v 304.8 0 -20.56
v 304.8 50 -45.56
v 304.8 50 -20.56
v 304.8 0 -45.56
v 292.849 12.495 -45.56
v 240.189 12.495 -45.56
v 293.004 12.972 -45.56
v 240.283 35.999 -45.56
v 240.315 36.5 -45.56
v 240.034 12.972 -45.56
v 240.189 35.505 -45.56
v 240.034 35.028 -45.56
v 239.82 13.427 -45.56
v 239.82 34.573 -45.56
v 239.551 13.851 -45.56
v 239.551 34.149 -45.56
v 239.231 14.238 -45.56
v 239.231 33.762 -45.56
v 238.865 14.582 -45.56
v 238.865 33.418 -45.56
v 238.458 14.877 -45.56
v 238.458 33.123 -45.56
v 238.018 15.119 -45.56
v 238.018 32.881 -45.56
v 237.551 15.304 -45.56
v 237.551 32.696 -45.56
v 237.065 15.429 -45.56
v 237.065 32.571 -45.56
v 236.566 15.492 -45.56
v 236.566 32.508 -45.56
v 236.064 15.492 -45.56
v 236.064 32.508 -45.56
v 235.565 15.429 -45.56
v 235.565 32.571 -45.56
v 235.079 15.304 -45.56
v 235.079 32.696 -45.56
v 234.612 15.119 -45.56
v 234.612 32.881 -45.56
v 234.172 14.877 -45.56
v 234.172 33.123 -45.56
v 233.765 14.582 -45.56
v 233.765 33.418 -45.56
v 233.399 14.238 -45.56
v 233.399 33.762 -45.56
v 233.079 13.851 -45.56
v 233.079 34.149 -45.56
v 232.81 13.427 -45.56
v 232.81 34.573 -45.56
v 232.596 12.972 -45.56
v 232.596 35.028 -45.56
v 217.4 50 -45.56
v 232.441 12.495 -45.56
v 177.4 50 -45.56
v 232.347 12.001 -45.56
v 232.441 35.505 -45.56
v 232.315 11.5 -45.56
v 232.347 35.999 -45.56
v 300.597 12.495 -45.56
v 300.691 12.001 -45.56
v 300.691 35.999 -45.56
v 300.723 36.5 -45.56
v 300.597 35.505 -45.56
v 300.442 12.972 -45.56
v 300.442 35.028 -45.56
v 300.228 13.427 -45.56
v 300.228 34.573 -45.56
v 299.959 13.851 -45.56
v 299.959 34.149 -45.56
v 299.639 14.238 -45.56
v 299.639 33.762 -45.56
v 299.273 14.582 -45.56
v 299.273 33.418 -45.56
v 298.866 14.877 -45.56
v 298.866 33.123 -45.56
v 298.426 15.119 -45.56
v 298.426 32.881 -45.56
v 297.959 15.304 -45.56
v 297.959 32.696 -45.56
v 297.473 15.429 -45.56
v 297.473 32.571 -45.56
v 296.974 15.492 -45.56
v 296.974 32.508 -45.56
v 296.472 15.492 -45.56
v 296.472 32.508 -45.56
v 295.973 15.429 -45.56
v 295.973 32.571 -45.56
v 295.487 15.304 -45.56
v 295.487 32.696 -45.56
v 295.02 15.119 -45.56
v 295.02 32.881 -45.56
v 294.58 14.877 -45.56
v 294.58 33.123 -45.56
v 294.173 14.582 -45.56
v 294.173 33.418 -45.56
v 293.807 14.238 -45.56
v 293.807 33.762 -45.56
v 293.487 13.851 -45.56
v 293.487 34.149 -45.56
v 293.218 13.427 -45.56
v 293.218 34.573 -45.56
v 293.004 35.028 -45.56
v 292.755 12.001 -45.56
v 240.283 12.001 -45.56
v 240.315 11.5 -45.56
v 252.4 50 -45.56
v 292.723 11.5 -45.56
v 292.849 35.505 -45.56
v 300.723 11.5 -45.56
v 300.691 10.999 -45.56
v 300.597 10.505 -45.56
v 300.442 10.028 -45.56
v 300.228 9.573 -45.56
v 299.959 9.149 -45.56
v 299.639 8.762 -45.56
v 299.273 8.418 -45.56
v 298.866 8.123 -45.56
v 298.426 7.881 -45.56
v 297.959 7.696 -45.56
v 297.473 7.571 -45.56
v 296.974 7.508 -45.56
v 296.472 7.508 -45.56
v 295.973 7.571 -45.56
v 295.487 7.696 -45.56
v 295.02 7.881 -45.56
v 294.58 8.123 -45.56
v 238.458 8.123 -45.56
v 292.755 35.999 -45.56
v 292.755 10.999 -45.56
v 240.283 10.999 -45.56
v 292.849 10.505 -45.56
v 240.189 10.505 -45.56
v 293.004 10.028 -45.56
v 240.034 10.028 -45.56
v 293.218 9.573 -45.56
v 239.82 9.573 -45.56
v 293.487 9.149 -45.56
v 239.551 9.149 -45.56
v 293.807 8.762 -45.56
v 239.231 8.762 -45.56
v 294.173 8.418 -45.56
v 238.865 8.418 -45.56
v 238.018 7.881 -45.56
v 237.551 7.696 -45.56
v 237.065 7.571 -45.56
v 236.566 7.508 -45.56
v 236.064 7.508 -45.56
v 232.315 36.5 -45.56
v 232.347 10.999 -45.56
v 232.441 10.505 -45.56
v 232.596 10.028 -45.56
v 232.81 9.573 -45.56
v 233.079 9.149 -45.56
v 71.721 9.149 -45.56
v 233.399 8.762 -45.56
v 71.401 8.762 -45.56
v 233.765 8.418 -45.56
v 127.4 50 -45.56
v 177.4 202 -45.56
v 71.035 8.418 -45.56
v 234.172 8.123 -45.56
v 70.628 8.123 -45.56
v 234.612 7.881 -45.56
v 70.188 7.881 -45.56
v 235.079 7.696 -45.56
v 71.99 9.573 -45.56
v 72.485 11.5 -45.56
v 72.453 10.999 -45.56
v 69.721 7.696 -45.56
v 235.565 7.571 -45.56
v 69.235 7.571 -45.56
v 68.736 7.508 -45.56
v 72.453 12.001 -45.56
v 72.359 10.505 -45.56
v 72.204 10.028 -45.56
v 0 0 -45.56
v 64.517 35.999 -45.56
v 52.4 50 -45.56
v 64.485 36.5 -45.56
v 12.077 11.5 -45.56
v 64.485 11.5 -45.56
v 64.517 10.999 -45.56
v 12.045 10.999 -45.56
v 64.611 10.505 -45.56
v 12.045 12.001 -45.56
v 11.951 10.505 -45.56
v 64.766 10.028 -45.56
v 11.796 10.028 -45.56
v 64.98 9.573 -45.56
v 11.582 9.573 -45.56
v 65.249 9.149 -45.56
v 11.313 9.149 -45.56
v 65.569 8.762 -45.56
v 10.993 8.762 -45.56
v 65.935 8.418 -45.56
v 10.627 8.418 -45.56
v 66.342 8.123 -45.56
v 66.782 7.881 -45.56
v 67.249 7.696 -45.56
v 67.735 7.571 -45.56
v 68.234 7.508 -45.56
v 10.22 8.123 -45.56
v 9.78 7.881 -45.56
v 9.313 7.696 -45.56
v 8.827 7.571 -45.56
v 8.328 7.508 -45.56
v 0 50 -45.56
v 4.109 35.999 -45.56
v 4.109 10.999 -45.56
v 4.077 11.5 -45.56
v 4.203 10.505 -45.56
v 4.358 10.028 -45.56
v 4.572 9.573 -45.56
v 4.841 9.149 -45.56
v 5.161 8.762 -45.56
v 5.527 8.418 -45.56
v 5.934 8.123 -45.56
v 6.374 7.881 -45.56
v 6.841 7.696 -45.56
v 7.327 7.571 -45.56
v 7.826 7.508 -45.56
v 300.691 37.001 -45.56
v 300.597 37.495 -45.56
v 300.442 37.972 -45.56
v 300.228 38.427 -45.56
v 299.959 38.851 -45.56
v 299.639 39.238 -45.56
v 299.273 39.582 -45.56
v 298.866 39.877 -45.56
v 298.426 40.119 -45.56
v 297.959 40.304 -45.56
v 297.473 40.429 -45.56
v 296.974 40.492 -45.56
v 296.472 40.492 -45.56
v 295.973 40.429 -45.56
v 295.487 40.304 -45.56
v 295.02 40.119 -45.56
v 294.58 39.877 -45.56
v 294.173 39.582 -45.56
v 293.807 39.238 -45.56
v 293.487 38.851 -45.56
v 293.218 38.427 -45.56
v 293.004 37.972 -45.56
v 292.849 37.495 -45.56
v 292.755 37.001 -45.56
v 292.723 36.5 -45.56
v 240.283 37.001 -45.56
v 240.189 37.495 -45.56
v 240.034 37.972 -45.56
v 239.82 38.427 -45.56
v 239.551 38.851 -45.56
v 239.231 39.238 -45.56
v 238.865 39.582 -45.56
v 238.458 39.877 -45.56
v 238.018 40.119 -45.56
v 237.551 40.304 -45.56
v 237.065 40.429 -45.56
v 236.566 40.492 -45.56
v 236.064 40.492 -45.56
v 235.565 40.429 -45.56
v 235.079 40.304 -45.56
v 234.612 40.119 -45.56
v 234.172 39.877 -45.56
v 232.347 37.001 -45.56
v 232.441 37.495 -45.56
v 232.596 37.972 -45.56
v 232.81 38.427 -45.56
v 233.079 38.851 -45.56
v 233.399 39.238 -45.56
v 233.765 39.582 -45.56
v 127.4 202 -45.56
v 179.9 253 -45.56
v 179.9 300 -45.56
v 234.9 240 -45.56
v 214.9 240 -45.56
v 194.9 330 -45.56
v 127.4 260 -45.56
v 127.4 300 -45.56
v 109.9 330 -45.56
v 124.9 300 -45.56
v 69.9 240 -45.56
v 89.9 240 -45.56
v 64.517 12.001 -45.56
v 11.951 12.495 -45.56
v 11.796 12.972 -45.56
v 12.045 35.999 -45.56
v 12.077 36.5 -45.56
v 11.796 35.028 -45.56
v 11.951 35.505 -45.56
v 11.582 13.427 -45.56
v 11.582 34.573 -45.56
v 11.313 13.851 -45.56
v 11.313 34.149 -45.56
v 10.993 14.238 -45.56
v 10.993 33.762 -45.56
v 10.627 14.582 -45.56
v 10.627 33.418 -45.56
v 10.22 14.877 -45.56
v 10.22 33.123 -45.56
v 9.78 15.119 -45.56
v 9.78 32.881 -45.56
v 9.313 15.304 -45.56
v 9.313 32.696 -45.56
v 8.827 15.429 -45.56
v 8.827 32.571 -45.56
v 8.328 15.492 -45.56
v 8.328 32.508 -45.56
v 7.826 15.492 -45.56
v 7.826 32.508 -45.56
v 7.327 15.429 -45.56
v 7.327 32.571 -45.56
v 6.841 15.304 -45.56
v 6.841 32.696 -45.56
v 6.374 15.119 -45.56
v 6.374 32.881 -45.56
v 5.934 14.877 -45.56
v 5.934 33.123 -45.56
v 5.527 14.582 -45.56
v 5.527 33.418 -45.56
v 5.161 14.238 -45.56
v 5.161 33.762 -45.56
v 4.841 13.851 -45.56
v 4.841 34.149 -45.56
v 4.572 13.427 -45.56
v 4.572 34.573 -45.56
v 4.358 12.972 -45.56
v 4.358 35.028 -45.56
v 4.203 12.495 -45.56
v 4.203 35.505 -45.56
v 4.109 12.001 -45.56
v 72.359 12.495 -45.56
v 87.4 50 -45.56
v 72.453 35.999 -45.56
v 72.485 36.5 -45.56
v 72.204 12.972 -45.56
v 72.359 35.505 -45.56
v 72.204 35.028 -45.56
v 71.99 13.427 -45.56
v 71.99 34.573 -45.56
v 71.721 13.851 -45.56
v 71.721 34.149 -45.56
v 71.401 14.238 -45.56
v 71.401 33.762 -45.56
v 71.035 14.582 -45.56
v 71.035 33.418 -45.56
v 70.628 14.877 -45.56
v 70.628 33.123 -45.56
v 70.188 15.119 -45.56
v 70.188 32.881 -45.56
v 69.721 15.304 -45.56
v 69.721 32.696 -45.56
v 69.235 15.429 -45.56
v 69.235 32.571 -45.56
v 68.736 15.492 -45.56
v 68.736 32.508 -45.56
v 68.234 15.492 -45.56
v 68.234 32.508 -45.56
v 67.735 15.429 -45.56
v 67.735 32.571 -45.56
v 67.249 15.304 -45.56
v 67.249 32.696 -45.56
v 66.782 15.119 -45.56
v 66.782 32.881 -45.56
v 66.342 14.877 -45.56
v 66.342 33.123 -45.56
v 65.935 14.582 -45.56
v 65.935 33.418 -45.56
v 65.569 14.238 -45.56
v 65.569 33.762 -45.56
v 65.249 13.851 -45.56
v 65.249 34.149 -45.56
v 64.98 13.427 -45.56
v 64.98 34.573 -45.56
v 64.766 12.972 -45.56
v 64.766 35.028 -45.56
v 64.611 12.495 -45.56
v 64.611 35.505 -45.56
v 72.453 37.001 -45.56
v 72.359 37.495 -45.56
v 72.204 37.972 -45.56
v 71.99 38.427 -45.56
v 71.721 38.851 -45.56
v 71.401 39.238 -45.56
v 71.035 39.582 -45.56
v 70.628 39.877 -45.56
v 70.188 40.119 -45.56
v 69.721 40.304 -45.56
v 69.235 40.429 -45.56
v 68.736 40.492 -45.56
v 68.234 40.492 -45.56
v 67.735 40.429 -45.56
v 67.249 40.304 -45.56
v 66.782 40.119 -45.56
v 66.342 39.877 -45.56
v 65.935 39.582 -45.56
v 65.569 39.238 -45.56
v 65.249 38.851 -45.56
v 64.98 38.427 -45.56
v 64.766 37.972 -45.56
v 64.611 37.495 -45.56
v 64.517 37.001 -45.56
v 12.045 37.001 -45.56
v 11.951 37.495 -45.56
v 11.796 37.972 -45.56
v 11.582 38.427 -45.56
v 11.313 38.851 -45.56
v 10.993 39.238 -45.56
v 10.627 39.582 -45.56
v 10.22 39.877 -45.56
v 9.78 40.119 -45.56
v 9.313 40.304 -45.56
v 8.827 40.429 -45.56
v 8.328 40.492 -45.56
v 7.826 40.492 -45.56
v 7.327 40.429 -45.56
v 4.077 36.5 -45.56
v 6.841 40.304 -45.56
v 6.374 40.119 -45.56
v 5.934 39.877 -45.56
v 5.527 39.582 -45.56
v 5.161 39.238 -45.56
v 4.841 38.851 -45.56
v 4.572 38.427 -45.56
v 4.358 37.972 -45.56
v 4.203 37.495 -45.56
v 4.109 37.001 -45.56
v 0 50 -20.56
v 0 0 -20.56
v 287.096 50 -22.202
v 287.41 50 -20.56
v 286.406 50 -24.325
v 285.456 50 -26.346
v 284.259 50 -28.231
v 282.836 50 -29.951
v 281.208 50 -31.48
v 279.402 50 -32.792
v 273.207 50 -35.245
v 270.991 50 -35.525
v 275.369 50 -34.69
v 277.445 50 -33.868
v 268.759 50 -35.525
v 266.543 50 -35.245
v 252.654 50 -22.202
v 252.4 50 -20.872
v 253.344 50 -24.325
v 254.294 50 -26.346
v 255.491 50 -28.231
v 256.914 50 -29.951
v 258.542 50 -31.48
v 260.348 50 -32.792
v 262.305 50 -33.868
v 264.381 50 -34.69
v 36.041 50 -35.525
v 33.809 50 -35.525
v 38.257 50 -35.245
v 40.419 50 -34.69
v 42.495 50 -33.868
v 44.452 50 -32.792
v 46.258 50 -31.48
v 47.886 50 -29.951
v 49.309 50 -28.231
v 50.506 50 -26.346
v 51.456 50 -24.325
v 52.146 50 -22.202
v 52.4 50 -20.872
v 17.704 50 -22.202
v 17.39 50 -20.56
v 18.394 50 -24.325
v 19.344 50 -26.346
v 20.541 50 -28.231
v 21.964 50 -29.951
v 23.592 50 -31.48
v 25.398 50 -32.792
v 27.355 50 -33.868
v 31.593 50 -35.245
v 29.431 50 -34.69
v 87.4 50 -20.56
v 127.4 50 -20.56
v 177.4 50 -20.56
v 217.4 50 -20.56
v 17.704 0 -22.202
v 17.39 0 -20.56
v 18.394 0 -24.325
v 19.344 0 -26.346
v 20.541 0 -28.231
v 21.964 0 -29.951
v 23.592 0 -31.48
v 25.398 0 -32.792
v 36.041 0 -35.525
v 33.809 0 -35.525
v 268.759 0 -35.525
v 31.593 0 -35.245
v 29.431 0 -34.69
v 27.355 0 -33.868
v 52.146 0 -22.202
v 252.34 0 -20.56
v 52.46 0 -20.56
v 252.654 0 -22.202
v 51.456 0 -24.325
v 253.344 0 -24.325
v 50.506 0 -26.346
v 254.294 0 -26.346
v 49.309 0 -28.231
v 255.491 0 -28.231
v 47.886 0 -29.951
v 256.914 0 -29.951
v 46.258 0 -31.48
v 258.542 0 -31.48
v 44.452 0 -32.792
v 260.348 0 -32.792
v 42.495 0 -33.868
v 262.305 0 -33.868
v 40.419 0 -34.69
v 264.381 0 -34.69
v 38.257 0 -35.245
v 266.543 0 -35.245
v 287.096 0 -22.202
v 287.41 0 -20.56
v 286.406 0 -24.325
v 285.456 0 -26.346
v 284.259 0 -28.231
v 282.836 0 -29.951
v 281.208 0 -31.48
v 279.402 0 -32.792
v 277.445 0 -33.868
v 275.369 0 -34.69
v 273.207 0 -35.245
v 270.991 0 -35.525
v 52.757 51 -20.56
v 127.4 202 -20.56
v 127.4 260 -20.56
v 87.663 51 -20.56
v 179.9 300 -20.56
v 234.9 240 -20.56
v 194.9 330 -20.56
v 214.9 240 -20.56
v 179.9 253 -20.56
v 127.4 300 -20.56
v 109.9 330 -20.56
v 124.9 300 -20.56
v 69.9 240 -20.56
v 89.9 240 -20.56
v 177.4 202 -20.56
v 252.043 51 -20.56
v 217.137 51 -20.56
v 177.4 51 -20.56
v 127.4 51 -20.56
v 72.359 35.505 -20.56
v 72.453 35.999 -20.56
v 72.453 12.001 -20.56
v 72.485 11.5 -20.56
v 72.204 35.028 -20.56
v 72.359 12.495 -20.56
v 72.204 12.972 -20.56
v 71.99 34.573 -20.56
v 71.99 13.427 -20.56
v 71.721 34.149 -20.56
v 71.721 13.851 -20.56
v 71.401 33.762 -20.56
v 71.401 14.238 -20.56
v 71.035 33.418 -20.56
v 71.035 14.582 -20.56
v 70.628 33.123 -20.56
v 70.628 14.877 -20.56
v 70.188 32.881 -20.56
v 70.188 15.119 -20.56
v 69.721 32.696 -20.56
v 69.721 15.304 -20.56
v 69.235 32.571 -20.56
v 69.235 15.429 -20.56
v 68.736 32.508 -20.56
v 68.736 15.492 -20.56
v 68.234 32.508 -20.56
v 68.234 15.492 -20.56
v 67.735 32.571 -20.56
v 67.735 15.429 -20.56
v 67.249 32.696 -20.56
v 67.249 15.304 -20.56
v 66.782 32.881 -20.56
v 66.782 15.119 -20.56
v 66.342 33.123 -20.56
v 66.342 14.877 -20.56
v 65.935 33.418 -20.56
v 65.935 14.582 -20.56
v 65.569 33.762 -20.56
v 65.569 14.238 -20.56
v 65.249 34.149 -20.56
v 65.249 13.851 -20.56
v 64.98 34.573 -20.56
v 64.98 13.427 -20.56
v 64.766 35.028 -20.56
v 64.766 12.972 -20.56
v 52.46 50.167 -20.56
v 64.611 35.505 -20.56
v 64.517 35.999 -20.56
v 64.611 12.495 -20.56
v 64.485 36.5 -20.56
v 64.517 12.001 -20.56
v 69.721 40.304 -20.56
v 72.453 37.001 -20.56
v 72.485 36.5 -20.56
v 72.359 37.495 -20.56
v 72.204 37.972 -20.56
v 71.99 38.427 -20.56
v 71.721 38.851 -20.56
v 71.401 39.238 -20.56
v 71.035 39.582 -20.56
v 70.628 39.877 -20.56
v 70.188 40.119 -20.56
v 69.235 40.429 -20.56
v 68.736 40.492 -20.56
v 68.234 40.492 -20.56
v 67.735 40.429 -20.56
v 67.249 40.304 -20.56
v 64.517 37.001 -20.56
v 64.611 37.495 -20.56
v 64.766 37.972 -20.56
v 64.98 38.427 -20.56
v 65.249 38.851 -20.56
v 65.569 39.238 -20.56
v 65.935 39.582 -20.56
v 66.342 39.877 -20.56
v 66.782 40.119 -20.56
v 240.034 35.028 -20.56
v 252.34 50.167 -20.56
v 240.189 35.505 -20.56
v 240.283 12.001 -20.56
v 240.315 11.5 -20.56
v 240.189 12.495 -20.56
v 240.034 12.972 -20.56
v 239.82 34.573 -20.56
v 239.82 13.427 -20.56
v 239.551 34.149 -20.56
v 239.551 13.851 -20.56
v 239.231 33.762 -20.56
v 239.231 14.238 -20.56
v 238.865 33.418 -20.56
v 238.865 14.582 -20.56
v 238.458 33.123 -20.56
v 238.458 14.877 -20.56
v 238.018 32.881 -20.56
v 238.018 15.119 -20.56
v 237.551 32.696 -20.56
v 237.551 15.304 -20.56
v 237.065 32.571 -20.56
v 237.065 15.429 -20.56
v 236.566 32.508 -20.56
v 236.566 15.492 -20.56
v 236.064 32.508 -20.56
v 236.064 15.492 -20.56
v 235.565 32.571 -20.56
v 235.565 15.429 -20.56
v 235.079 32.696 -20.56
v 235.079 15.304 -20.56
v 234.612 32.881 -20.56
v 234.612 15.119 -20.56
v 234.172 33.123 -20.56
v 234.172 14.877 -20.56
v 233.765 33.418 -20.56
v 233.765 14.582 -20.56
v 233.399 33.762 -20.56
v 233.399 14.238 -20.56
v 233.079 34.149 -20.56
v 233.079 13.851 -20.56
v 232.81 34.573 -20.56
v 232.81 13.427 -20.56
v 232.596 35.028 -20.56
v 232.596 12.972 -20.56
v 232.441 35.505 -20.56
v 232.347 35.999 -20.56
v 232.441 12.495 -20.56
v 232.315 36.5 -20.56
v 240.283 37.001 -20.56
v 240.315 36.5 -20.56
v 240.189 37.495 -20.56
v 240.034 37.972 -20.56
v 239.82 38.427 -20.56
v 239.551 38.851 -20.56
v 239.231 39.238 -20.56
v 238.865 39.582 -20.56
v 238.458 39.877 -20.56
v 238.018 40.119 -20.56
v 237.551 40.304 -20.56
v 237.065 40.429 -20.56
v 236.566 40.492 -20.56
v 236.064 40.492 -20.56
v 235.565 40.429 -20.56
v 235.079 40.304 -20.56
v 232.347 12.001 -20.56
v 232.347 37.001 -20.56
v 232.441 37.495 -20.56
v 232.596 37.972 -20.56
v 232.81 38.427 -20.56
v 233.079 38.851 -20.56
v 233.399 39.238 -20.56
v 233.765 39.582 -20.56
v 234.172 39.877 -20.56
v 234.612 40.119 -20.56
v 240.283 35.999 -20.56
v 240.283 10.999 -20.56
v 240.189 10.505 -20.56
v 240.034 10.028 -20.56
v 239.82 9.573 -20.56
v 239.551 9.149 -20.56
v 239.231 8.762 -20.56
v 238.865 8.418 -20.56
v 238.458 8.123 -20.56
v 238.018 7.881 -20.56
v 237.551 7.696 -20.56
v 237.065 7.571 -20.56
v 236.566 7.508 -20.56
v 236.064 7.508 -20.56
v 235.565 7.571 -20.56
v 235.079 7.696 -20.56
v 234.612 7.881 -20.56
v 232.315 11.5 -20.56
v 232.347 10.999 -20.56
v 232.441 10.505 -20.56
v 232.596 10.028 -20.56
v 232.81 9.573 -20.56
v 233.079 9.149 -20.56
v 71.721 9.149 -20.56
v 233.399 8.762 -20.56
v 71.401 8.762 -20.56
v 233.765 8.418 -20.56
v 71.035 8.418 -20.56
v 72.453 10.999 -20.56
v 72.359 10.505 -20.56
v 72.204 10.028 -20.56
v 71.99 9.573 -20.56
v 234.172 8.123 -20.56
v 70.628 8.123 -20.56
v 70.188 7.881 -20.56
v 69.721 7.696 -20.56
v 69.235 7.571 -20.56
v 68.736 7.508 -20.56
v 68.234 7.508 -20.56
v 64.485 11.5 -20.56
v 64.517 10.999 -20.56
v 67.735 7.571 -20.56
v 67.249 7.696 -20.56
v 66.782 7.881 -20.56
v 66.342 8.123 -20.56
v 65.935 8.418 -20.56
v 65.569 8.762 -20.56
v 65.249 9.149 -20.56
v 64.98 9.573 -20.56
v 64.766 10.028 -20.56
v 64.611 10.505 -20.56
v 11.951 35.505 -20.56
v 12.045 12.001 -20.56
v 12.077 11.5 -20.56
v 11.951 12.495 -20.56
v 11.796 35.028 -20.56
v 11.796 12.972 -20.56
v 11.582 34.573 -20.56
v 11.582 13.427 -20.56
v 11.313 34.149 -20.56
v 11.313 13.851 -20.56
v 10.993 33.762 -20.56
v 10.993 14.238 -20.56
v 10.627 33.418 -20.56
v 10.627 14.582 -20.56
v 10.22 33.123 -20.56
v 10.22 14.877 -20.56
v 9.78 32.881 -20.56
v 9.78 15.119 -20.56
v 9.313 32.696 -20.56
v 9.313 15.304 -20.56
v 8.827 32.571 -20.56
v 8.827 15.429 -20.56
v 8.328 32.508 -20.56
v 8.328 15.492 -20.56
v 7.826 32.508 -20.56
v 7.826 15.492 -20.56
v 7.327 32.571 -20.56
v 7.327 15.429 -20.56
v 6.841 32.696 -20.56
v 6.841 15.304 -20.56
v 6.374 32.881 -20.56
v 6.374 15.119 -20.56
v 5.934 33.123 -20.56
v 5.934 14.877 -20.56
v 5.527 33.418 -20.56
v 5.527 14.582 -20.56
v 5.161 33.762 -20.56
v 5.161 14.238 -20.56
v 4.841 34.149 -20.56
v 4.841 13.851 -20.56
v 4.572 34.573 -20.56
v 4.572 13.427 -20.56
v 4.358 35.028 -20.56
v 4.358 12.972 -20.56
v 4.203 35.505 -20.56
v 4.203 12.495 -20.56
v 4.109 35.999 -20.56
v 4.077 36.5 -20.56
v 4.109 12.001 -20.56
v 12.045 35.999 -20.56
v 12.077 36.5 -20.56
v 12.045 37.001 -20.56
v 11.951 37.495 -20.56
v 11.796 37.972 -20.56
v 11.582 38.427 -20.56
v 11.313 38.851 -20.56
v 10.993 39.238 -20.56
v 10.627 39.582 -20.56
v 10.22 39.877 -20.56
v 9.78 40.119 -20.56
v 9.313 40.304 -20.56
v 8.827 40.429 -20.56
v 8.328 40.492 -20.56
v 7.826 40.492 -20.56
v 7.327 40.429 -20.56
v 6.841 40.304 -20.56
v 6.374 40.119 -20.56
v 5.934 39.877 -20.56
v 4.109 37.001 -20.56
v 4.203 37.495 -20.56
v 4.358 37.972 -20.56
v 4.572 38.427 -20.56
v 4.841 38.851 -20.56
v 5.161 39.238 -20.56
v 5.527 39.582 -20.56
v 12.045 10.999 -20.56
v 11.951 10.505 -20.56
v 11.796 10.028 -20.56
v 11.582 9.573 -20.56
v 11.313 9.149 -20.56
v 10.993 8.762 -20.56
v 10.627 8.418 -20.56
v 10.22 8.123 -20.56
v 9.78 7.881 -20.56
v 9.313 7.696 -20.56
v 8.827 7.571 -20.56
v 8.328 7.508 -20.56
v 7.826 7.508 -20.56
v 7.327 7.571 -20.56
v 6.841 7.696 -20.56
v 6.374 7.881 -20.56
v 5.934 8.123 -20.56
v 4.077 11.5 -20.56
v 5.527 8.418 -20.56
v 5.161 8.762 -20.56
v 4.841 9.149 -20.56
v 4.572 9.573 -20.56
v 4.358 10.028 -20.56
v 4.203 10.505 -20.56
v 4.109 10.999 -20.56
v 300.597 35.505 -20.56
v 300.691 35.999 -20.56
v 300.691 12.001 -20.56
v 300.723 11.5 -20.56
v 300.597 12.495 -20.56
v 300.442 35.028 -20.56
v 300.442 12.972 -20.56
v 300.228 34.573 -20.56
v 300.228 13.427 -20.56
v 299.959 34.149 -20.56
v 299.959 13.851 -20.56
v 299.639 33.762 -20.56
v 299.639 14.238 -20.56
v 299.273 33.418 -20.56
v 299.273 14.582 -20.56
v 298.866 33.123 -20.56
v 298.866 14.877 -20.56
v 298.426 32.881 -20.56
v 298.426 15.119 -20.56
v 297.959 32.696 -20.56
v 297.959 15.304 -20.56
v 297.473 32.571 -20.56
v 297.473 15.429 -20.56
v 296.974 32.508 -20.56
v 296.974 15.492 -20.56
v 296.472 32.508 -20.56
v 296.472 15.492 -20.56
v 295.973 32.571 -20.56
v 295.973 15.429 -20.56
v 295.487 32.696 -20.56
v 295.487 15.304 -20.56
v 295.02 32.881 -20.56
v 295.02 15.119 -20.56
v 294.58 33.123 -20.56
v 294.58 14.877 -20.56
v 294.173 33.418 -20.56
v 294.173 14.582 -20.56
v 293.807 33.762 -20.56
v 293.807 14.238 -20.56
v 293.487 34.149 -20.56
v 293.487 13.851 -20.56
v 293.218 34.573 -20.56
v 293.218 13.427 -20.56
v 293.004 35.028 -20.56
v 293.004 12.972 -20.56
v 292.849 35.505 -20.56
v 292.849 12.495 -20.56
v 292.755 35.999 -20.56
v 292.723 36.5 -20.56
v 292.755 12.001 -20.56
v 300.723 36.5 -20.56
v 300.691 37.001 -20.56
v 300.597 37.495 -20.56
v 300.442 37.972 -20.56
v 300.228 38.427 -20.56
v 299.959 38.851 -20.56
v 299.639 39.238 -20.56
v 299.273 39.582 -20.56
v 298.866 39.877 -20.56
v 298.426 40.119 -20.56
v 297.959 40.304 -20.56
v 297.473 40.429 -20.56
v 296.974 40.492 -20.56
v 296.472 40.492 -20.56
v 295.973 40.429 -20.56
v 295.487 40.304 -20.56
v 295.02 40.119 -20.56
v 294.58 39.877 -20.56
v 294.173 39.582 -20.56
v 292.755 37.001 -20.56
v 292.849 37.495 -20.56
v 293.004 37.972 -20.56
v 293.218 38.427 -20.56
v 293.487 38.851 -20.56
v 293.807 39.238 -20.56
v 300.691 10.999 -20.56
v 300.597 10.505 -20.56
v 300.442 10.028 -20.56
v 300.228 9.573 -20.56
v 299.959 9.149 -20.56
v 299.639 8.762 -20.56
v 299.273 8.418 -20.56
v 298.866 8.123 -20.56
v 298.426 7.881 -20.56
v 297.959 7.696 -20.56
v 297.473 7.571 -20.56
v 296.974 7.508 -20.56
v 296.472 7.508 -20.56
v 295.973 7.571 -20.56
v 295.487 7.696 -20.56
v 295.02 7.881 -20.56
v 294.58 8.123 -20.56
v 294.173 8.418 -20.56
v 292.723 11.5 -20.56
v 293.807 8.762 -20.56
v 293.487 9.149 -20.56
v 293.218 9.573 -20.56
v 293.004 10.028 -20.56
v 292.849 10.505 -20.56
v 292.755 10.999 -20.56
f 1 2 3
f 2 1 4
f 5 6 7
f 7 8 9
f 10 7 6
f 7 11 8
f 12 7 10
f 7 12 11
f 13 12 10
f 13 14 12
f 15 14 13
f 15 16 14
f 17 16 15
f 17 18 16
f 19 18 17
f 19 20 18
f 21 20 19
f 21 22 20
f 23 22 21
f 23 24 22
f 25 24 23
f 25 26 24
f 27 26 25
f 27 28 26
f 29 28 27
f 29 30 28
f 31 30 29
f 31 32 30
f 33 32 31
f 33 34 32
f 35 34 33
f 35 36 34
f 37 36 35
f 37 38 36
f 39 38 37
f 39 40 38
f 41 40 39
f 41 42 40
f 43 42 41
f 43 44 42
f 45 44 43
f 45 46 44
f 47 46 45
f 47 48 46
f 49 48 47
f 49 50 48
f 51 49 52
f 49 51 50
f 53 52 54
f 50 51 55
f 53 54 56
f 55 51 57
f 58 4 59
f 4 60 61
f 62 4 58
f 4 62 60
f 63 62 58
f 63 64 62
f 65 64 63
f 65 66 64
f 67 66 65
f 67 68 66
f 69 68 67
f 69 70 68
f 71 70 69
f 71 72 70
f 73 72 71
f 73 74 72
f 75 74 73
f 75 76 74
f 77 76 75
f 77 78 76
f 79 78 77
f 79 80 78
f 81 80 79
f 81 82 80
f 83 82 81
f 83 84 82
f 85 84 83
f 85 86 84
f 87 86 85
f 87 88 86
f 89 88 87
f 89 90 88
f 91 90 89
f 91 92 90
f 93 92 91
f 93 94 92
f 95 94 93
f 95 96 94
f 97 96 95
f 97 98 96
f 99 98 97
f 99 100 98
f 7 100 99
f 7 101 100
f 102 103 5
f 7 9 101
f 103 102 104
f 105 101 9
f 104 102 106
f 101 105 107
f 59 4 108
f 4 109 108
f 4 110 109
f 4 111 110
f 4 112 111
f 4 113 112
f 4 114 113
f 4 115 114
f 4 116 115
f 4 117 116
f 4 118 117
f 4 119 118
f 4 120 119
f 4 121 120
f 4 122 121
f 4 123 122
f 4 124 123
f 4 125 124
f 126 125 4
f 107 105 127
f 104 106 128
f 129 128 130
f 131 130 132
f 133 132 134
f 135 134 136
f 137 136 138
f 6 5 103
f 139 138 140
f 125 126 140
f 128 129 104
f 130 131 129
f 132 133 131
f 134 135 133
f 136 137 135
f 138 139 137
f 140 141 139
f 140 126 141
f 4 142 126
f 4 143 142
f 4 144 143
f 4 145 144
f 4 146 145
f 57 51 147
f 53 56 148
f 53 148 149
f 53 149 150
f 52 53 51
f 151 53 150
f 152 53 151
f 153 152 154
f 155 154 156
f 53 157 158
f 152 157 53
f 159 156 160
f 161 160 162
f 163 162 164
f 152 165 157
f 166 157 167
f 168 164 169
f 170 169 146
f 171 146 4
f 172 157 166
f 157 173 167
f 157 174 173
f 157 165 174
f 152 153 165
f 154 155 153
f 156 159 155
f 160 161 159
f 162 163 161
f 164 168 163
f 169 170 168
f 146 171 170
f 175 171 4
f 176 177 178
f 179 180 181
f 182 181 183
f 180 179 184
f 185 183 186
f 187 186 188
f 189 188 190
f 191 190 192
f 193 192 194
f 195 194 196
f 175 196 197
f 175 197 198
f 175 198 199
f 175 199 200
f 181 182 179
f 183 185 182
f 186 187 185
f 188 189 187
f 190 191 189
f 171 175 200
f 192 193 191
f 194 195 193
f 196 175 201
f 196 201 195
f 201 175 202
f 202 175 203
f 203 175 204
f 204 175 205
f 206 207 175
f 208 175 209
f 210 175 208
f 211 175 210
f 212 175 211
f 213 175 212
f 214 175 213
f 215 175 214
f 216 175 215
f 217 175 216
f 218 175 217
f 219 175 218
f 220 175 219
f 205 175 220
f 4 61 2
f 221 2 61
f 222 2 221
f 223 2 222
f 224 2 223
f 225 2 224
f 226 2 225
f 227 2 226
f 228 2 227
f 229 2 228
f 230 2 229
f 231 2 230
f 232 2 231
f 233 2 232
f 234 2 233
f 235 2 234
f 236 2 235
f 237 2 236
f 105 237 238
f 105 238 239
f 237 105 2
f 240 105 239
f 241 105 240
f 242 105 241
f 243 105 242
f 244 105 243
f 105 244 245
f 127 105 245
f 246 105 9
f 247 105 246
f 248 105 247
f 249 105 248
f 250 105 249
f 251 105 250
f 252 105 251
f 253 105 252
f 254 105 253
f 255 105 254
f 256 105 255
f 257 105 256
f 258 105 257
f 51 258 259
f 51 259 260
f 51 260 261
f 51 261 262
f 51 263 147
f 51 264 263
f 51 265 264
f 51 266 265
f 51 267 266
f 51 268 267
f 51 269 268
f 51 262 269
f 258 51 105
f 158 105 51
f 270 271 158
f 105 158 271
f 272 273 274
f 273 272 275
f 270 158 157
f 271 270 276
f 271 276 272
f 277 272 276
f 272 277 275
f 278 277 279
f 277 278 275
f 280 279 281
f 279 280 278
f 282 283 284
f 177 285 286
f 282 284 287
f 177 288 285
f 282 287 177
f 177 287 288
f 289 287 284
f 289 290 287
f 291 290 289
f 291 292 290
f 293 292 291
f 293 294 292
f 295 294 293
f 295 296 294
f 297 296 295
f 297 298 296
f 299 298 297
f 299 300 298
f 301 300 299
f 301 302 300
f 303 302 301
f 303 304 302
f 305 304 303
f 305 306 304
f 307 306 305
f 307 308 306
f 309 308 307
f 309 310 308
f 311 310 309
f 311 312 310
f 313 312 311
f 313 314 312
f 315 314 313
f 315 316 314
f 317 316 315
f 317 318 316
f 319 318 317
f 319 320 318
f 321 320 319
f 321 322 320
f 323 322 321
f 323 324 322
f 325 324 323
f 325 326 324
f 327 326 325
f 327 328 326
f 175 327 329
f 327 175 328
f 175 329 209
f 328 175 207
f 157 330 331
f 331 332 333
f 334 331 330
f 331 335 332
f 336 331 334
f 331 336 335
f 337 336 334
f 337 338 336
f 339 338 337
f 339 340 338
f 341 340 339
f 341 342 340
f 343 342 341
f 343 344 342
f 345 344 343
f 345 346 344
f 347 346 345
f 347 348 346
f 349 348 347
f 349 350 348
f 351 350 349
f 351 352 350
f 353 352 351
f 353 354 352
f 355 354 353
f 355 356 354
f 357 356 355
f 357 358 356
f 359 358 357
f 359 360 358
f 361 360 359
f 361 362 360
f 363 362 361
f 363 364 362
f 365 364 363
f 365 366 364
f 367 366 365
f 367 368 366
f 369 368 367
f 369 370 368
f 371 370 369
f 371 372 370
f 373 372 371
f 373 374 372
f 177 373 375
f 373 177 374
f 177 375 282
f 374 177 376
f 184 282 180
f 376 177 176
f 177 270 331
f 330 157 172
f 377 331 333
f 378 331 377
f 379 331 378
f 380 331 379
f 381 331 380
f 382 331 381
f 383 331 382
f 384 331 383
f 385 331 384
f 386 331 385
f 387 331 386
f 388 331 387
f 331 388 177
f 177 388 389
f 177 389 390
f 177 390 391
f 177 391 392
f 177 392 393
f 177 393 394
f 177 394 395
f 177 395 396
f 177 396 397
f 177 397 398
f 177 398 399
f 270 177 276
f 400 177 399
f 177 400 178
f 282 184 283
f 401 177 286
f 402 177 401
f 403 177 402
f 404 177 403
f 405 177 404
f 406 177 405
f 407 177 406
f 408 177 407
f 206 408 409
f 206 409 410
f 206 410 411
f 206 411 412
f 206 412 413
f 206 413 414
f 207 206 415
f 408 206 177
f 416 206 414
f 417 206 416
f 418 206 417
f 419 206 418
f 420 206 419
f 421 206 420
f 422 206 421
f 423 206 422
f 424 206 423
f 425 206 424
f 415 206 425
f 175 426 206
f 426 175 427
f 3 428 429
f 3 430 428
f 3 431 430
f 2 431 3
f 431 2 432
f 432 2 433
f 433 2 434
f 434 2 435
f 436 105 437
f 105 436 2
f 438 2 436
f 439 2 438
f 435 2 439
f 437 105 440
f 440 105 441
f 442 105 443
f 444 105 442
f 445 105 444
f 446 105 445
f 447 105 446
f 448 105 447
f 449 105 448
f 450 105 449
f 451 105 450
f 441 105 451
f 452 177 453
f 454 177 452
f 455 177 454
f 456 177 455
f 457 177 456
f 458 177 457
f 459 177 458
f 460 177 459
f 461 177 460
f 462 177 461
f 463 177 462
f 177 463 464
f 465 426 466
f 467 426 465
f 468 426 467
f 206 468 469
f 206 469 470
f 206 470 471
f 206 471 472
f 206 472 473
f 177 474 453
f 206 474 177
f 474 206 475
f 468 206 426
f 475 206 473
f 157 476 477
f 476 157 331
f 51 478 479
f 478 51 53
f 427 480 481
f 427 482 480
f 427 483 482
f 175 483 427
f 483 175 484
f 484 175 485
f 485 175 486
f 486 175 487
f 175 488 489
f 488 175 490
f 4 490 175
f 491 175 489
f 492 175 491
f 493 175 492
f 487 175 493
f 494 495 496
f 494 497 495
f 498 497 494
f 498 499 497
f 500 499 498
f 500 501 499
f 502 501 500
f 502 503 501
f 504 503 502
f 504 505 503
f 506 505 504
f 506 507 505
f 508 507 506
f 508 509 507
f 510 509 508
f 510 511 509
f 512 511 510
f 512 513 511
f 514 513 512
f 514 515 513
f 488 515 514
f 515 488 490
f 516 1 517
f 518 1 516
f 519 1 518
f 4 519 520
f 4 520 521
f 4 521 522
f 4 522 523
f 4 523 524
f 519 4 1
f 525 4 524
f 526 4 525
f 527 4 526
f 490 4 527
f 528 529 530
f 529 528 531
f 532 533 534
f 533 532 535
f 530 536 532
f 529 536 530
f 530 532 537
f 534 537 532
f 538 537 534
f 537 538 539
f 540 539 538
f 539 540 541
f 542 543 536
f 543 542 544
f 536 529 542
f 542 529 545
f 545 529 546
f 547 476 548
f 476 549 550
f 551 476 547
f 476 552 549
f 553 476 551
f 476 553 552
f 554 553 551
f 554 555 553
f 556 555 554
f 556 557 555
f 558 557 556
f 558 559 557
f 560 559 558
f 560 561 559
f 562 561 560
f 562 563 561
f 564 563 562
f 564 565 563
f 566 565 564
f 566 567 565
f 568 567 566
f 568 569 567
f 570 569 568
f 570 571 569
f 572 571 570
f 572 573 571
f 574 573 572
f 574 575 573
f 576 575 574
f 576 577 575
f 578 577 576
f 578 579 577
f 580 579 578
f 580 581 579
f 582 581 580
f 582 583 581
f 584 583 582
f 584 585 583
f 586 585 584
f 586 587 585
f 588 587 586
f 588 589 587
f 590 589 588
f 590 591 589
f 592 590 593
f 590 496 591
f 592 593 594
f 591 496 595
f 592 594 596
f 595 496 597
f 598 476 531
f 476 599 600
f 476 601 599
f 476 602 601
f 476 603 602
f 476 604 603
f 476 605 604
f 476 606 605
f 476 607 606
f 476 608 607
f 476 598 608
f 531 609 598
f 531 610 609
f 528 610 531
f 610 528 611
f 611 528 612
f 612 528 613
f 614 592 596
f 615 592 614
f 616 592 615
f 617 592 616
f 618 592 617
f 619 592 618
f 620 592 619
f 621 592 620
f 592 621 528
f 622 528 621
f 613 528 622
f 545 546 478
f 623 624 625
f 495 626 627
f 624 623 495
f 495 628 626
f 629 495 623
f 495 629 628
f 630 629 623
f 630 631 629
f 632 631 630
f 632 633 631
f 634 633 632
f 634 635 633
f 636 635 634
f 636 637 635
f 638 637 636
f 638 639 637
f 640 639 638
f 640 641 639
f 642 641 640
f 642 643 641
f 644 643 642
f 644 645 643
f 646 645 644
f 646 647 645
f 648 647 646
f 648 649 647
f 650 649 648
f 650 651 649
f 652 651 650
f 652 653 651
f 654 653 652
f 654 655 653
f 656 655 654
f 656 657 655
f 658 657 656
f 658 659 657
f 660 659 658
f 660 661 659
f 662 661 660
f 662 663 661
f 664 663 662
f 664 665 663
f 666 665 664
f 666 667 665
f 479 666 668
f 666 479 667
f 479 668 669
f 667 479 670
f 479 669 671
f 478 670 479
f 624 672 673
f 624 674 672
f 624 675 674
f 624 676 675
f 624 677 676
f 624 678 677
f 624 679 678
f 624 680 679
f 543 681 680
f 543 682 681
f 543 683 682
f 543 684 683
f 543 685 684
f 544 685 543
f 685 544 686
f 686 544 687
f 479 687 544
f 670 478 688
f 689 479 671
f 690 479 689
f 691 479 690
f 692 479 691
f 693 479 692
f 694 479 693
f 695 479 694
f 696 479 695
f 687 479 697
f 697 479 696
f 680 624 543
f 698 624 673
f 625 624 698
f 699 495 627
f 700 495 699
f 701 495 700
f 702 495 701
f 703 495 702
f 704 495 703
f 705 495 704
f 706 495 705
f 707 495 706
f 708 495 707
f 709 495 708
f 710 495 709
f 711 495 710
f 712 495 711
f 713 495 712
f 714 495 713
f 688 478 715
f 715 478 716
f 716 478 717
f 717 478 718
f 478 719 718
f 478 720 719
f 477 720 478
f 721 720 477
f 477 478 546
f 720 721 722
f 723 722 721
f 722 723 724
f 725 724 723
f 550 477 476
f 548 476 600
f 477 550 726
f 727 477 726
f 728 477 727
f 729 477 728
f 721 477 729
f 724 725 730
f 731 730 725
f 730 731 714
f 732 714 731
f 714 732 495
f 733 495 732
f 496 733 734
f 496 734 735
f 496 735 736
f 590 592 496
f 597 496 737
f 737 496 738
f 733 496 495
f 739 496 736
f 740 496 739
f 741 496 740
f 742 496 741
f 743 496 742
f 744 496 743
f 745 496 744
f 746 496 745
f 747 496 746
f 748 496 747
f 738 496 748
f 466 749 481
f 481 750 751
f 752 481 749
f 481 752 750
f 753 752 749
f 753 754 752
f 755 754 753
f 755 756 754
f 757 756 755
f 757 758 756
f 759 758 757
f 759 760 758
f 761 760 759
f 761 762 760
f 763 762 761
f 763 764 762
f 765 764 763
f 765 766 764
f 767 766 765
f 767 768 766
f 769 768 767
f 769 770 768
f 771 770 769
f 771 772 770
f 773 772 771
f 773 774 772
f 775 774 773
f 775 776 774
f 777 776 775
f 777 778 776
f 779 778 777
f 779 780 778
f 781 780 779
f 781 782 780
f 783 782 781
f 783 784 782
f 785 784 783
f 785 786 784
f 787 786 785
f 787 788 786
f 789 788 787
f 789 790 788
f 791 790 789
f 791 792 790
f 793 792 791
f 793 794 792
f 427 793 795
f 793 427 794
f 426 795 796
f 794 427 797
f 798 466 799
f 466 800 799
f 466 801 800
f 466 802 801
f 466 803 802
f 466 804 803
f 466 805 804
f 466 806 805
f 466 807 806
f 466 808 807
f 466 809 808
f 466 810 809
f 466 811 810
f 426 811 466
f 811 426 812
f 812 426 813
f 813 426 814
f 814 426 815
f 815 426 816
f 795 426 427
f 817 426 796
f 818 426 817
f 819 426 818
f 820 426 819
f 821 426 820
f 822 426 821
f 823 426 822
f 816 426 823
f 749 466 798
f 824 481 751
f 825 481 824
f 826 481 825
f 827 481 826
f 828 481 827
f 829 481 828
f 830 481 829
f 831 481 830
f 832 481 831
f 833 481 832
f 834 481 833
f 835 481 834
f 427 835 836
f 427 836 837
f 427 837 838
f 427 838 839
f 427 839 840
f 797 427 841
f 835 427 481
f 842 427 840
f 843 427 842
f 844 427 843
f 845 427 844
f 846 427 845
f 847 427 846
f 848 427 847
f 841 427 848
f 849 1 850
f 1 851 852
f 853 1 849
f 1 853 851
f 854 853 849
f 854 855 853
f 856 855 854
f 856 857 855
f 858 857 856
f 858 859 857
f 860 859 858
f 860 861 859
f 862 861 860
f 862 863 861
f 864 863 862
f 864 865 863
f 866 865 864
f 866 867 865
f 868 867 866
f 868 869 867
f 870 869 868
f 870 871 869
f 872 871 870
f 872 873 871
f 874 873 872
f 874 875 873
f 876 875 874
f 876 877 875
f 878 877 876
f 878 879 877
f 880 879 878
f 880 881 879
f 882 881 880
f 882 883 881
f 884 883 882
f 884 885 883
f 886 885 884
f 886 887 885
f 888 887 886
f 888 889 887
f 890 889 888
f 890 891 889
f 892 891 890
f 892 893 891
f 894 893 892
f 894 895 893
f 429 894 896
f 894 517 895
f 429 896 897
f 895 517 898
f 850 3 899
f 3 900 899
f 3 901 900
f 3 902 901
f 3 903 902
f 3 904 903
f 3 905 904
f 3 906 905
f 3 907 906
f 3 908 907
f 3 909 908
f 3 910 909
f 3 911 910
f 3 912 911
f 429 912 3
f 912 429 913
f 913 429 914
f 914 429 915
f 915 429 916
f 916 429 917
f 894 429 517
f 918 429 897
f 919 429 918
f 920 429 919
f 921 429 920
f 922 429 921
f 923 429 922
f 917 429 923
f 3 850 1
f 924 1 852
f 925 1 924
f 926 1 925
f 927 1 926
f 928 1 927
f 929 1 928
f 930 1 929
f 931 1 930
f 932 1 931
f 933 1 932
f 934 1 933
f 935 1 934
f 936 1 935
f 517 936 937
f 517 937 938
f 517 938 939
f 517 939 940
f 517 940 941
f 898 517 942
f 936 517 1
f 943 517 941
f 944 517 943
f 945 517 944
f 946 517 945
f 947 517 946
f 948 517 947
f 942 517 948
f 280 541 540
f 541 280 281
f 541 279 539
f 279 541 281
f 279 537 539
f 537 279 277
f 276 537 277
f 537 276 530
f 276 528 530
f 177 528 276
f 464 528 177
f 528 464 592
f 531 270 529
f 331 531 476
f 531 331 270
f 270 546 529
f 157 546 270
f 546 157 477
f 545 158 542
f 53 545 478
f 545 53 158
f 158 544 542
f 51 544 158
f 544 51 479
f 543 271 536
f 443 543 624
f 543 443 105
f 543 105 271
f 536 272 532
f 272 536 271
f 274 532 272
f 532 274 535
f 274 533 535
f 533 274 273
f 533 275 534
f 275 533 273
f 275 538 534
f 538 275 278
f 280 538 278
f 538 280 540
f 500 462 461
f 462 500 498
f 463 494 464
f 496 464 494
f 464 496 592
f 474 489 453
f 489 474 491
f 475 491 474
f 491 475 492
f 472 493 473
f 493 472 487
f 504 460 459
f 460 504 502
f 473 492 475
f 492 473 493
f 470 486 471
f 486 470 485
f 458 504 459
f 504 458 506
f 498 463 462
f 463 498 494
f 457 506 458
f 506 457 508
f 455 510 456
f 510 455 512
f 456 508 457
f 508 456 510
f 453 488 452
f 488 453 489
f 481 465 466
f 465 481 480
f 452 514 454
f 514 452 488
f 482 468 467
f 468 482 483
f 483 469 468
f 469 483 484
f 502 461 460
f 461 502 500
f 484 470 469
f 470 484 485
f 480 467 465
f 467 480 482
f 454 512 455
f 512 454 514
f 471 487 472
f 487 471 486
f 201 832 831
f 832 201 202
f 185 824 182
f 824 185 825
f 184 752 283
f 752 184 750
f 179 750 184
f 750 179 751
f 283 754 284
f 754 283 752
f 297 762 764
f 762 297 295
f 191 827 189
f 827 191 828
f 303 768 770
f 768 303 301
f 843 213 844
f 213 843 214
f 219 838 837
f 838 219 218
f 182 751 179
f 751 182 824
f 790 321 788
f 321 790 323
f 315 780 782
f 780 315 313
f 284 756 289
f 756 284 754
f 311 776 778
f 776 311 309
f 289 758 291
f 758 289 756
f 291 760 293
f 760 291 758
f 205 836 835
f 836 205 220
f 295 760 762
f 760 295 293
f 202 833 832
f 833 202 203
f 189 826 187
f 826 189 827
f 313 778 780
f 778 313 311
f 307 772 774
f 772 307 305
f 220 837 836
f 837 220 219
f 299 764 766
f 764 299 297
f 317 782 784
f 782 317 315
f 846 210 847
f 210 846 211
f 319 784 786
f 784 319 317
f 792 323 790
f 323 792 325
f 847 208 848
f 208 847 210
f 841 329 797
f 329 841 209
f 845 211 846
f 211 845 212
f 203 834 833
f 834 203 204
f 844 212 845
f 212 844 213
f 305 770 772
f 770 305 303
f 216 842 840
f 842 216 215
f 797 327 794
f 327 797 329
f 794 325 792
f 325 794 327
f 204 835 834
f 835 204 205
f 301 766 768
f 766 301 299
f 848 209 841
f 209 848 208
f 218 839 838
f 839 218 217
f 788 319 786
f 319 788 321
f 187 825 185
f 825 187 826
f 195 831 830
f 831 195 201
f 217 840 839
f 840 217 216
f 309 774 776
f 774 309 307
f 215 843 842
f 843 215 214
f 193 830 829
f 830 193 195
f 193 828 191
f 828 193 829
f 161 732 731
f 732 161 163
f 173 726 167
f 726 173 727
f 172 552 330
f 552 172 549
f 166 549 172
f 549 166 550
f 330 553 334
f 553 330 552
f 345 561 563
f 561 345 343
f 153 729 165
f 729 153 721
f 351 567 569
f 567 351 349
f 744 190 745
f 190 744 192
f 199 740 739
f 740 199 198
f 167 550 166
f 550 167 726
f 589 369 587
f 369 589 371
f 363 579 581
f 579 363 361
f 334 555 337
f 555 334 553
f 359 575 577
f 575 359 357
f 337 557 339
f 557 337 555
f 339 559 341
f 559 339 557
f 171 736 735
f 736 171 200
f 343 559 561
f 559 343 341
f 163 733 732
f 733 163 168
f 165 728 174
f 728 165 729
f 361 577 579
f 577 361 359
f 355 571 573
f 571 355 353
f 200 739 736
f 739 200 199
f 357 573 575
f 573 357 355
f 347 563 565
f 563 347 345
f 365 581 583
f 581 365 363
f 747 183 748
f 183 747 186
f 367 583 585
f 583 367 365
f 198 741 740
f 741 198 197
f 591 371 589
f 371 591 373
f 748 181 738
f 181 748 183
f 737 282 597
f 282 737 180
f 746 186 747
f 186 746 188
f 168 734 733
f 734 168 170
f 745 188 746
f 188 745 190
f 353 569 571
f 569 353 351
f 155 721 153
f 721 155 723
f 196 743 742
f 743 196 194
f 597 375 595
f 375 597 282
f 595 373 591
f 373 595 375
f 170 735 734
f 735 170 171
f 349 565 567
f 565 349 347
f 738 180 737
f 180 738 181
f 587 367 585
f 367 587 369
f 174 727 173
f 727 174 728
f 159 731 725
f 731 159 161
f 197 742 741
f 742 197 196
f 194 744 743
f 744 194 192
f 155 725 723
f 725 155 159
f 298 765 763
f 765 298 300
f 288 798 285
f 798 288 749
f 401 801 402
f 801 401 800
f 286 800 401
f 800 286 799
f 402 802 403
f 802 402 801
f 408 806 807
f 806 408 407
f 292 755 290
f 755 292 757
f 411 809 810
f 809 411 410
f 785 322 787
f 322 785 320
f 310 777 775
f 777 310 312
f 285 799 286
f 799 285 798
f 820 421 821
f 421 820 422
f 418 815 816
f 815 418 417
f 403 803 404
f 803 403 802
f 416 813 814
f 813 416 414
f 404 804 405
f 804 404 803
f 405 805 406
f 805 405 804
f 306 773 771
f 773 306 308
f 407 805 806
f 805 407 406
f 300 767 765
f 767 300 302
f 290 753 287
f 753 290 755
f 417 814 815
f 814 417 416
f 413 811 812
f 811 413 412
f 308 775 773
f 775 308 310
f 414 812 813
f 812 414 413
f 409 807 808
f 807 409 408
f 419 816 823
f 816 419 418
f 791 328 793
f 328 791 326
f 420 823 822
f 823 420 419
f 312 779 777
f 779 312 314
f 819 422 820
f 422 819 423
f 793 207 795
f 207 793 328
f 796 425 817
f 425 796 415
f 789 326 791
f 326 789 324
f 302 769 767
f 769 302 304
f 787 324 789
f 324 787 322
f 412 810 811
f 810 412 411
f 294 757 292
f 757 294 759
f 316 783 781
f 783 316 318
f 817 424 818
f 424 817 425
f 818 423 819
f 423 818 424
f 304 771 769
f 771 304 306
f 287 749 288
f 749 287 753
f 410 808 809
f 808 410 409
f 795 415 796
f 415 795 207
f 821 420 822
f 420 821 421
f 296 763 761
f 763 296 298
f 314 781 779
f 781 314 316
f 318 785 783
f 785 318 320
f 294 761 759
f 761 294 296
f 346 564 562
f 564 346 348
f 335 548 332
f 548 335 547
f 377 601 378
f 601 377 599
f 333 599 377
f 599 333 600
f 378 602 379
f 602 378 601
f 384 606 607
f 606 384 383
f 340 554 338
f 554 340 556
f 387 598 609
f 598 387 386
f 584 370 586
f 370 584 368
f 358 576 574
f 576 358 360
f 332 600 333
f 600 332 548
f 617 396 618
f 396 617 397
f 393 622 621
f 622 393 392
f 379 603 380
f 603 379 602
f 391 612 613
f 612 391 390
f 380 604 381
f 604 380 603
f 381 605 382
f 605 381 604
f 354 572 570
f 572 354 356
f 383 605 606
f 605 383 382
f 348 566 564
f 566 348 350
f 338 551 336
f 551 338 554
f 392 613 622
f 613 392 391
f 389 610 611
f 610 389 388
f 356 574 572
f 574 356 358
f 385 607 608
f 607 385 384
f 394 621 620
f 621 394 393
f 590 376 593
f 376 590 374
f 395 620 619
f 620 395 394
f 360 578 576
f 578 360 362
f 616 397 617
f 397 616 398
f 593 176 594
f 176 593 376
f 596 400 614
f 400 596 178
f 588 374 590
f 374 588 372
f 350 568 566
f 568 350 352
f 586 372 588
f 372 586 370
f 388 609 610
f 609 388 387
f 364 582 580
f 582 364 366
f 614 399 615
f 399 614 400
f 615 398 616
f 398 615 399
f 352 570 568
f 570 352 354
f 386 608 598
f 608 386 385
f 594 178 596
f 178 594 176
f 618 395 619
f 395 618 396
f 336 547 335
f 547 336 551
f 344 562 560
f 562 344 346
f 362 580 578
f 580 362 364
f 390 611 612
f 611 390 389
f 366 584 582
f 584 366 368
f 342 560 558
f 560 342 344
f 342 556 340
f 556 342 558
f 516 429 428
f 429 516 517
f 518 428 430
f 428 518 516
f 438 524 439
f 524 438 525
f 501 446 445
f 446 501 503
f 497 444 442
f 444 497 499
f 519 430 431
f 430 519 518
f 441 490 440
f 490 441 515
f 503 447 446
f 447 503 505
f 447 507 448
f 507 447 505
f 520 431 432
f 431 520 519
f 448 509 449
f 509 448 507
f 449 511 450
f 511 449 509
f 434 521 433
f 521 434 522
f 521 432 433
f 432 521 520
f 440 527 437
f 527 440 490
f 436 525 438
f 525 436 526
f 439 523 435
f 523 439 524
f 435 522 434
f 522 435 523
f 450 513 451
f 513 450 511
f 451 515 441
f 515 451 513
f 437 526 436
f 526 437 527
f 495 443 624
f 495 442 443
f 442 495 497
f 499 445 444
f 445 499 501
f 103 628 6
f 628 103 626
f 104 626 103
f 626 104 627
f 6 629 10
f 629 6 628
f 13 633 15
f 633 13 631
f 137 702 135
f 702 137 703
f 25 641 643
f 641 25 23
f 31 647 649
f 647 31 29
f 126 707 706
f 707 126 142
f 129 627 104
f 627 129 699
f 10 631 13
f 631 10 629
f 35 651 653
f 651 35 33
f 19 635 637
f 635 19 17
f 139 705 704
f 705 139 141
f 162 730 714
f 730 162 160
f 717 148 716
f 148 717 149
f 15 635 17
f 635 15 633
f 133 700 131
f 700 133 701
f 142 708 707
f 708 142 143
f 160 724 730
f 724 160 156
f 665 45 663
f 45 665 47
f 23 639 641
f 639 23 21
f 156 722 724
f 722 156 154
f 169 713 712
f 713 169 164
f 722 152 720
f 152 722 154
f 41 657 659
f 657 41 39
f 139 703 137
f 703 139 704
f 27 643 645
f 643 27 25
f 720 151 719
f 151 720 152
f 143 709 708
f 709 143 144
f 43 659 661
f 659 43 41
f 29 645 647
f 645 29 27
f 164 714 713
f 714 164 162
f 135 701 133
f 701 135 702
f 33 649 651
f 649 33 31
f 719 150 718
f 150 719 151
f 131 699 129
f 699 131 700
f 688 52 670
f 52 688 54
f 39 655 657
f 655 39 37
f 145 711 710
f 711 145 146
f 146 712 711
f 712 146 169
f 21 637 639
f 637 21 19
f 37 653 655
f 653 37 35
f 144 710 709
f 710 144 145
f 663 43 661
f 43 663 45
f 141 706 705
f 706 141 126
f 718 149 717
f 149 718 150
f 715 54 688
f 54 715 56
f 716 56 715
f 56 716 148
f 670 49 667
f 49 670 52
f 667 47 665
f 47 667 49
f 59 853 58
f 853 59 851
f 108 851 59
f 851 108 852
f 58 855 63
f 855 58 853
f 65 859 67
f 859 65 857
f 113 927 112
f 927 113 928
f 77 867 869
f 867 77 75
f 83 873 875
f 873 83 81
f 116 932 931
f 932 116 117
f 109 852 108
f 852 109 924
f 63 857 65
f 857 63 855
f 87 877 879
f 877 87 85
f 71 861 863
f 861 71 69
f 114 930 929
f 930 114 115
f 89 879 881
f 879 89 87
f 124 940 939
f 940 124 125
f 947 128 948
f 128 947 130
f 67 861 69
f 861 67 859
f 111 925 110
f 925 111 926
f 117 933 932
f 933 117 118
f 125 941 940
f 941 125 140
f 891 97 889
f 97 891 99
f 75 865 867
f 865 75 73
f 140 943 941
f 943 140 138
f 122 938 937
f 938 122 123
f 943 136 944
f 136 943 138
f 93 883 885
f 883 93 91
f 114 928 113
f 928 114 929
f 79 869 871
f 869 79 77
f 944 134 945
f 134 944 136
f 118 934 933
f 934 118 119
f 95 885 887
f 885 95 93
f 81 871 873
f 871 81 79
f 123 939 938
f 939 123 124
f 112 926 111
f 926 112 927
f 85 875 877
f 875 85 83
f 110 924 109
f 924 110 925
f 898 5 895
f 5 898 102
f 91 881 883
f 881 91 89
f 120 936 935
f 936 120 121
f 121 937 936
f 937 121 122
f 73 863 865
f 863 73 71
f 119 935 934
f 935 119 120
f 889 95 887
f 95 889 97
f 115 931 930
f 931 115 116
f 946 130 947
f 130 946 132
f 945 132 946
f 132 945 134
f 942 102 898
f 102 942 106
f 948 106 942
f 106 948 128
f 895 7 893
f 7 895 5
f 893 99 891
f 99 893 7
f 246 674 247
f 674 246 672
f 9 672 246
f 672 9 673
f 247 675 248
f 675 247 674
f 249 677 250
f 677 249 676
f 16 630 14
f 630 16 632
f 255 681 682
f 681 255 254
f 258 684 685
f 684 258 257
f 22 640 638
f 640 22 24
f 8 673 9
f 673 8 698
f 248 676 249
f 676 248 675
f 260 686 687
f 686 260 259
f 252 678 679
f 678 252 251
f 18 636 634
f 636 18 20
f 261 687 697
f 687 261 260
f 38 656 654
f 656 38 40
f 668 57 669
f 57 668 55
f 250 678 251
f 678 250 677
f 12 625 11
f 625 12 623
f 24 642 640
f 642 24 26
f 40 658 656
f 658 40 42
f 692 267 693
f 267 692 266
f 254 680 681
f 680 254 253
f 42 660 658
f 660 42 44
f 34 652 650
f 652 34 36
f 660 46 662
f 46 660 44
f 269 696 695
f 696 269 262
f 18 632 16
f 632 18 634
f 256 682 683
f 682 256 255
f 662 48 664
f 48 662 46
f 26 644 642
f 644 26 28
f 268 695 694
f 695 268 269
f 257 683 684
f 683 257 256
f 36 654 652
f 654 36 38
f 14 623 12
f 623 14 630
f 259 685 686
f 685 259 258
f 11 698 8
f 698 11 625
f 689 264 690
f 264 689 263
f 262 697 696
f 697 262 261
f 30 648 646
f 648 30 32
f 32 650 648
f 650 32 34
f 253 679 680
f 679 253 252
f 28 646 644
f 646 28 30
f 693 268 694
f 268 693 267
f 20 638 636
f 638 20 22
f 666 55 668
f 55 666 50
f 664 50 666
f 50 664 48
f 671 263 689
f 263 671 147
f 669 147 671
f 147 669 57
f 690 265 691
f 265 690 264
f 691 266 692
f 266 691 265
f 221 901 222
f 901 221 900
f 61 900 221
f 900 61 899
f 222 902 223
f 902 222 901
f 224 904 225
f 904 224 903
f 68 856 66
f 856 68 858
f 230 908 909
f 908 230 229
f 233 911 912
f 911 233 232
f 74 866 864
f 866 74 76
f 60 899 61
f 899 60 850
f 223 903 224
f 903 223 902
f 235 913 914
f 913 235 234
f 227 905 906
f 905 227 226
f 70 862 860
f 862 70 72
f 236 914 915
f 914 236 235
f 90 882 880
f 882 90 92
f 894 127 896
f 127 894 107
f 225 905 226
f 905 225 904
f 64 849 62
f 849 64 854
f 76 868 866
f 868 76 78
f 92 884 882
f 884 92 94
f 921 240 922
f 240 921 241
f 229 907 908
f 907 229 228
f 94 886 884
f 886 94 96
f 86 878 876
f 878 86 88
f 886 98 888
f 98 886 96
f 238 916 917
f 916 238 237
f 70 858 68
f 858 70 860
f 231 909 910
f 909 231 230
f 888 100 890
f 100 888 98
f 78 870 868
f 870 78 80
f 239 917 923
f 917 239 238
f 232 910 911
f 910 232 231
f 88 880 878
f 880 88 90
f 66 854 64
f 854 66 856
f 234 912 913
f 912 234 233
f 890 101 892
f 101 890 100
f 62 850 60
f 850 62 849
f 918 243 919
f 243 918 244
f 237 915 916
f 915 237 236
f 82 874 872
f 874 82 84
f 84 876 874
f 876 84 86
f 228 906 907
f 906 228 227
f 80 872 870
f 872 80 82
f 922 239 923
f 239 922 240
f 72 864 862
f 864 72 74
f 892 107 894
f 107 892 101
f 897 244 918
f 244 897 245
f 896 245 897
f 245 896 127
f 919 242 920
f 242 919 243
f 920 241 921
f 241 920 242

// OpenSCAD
/*
    Speederbike outrigger mid brace
*/

TOLERANCE = 2;
MIN_WALL_THICKNESS = 10;

LENGTH = 304.8;                 // 12"
WIDTH = 50;
HEIGHT = 75; //25.4;

TRIANGLE_LENGTH = 230;
TRIANGLE_WIDTH = 280;

PIPE_OD = 33.56;                // 1" PVC measured OD, not even close to 1"
PIPE_INSIDE_SPACING = 234.95;   // 9.25"
TOP_TUBE_DIAMETER = 22.61;
TOP_TUBE_SLOT = 56; //54.19;
TOP_TUBE_GAP = 15;
BOLT_DIAMETER = 8;              // slightly larger than 1/4"

$fn=50;

difference(){
    
    union(){
        // clamp
        translate([0,0,-(PIPE_OD+TOLERANCE)-MIN_WALL_THICKNESS]){
            cube([LENGTH,WIDTH,HEIGHT]);
        }
        
        // triangle thing
        translate([(LENGTH/2)-(50/2),WIDTH,-PIPE_OD-MIN_WALL_THICKNESS-TOLERANCE]){
            
            linear_extrude(25){
            // core
            #polygon([[0,0],[0,280],[50,280],[50,0]]);
            
            // bottom leaf
            translate([(-200/2)+(50/2),0,0]){
                difference(){
                    polygon([[0,0],[(200/2),280],[200,0]]);
                    translate([35,0,0]){
                        polygon([[0,0],[50,190],[50,0]]);
                    };
                    translate([200-35-50,0,0]){
                        polygon([[0,0],[0,190],[50,0]]);
                    }
                }
            }
            
            // top leaf
            translate([-((40+85+40)/2)+(50/2),190,0]){
                difference(){
                    polygon([[0,0],[40,90],[85+40,90],[40+85+40,0]]);
                    translate([20,0,0]){
                        polygon([[0,0],[35,60],[40,60],[40,0]]);
                    }
                    translate([(40+85+40)-20-35,0,0]){
                        polygon([[0,0],[0,60],[35,0]]);
                    }
                }
            }
            }
        }
    }
    
    // pipe holders
    translate([(LENGTH/2)-(PIPE_INSIDE_SPACING/2),-1,-(PIPE_OD+TOLERANCE)/2]){
        rotate([-90,0,0]){
            cylinder(r=(PIPE_OD+TOLERANCE)/2,h=WIDTH+2);            
        }
        translate([-(PIPE_OD+TOLERANCE)/2,0,0]){
            cube([PIPE_OD+TOLERANCE,WIDTH+2,HEIGHT]);
        }
    
        // bolt holes
        translate([-PIPE_OD*0.80,WIDTH/4,-PIPE_OD]){
            cylinder(r=BOLT_DIAMETER/2,h=HEIGHT+2);
        }
        translate([PIPE_OD,WIDTH/4,-PIPE_OD]){
            cylinder(r=BOLT_DIAMETER/2,h=HEIGHT+2);
        }
        translate([-PIPE_OD*0.80,WIDTH-(WIDTH/4),-PIPE_OD]){
            cylinder(r=BOLT_DIAMETER/2,h=HEIGHT+2);
        }
        translate([PIPE_OD,WIDTH-(WIDTH/4),-PIPE_OD]){
            cylinder(r=BOLT_DIAMETER/2,h=HEIGHT+2);
        }
    }
    translate([(LENGTH/2)+(PIPE_INSIDE_SPACING/2),-1,-(PIPE_OD+TOLERANCE)/2]){
        rotate([-90,0,0]){
            cylinder(r=(PIPE_OD+TOLERANCE)/2,h=WIDTH+2);
        }
        translate([-(PIPE_OD+TOLERANCE)/2,0,0]){
            cube([PIPE_OD+TOLERANCE,WIDTH+2,HEIGHT]);
        }
        
        // bolt holes
        translate([-PIPE_OD,WIDTH/4,-PIPE_OD]){
            cylinder(r=BOLT_DIAMETER/2,h=HEIGHT+2);
        }
        translate([PIPE_OD*0.80,WIDTH/4,-PIPE_OD]){
            cylinder(r=BOLT_DIAMETER/2,h=HEIGHT+2);
        }
        translate([-PIPE_OD,WIDTH-(WIDTH/4),-PIPE_OD]){
            cylinder(r=BOLT_DIAMETER/2,h=HEIGHT+2);
        }
        translate([PIPE_OD*0.80,WIDTH-(WIDTH/4),-PIPE_OD]){
            cylinder(r=BOLT_DIAMETER/2,h=HEIGHT+2);
        }
    }
    
    /*
    // top-tube slot
    tt_min = TOP_TUBE_SLOT;    // TOP_TUBE_SLOT
    tt_max = 65;    // fresh measurement
    
    translate([(LENGTH/2)-(tt_max/2),-1,-1]){
        //cube([TOP_TUBE_SLOT,WIDTH+2,TOP_TUBE_DIAMETER+1]);
        
        linear_extrude(TOP_TUBE_DIAMETER+1){
            polygon([[0,0],[(tt_max-tt_min)/2,WIDTH+2],[tt_max-((tt_max-tt_min))/2,WIDTH+2],[tt_max,0]]);
        }
        
        // bolt holes
        translate([-tt_max/4,WIDTH/2,-TOP_TUBE_DIAMETER]){
            cylinder(r=BOLT_DIAMETER/2,h=HEIGHT);
        }
        translate([tt_max+(tt_max/4),WIDTH/2,-TOP_TUBE_DIAMETER]){
            cylinder(r=BOLT_DIAMETER/2,h=HEIGHT);
        }
    }
    
    // cut-out excess underneath
    translate([LENGTH/2,-1,-((PIPE_OD+TOLERANCE)-MIN_WALL_THICKNESS)-LENGTH/2.45]){
        rotate([-90,0,0]){
            cylinder(r=LENGTH/2,h=WIDTH+2);
        }
    }
    */
    
    // cut-out excess above pipes
    translate([-1,-1,-20.56]){
        cube([LENGTH+TOLERANCE,WIDTH+2,HEIGHT]);
    }
}
